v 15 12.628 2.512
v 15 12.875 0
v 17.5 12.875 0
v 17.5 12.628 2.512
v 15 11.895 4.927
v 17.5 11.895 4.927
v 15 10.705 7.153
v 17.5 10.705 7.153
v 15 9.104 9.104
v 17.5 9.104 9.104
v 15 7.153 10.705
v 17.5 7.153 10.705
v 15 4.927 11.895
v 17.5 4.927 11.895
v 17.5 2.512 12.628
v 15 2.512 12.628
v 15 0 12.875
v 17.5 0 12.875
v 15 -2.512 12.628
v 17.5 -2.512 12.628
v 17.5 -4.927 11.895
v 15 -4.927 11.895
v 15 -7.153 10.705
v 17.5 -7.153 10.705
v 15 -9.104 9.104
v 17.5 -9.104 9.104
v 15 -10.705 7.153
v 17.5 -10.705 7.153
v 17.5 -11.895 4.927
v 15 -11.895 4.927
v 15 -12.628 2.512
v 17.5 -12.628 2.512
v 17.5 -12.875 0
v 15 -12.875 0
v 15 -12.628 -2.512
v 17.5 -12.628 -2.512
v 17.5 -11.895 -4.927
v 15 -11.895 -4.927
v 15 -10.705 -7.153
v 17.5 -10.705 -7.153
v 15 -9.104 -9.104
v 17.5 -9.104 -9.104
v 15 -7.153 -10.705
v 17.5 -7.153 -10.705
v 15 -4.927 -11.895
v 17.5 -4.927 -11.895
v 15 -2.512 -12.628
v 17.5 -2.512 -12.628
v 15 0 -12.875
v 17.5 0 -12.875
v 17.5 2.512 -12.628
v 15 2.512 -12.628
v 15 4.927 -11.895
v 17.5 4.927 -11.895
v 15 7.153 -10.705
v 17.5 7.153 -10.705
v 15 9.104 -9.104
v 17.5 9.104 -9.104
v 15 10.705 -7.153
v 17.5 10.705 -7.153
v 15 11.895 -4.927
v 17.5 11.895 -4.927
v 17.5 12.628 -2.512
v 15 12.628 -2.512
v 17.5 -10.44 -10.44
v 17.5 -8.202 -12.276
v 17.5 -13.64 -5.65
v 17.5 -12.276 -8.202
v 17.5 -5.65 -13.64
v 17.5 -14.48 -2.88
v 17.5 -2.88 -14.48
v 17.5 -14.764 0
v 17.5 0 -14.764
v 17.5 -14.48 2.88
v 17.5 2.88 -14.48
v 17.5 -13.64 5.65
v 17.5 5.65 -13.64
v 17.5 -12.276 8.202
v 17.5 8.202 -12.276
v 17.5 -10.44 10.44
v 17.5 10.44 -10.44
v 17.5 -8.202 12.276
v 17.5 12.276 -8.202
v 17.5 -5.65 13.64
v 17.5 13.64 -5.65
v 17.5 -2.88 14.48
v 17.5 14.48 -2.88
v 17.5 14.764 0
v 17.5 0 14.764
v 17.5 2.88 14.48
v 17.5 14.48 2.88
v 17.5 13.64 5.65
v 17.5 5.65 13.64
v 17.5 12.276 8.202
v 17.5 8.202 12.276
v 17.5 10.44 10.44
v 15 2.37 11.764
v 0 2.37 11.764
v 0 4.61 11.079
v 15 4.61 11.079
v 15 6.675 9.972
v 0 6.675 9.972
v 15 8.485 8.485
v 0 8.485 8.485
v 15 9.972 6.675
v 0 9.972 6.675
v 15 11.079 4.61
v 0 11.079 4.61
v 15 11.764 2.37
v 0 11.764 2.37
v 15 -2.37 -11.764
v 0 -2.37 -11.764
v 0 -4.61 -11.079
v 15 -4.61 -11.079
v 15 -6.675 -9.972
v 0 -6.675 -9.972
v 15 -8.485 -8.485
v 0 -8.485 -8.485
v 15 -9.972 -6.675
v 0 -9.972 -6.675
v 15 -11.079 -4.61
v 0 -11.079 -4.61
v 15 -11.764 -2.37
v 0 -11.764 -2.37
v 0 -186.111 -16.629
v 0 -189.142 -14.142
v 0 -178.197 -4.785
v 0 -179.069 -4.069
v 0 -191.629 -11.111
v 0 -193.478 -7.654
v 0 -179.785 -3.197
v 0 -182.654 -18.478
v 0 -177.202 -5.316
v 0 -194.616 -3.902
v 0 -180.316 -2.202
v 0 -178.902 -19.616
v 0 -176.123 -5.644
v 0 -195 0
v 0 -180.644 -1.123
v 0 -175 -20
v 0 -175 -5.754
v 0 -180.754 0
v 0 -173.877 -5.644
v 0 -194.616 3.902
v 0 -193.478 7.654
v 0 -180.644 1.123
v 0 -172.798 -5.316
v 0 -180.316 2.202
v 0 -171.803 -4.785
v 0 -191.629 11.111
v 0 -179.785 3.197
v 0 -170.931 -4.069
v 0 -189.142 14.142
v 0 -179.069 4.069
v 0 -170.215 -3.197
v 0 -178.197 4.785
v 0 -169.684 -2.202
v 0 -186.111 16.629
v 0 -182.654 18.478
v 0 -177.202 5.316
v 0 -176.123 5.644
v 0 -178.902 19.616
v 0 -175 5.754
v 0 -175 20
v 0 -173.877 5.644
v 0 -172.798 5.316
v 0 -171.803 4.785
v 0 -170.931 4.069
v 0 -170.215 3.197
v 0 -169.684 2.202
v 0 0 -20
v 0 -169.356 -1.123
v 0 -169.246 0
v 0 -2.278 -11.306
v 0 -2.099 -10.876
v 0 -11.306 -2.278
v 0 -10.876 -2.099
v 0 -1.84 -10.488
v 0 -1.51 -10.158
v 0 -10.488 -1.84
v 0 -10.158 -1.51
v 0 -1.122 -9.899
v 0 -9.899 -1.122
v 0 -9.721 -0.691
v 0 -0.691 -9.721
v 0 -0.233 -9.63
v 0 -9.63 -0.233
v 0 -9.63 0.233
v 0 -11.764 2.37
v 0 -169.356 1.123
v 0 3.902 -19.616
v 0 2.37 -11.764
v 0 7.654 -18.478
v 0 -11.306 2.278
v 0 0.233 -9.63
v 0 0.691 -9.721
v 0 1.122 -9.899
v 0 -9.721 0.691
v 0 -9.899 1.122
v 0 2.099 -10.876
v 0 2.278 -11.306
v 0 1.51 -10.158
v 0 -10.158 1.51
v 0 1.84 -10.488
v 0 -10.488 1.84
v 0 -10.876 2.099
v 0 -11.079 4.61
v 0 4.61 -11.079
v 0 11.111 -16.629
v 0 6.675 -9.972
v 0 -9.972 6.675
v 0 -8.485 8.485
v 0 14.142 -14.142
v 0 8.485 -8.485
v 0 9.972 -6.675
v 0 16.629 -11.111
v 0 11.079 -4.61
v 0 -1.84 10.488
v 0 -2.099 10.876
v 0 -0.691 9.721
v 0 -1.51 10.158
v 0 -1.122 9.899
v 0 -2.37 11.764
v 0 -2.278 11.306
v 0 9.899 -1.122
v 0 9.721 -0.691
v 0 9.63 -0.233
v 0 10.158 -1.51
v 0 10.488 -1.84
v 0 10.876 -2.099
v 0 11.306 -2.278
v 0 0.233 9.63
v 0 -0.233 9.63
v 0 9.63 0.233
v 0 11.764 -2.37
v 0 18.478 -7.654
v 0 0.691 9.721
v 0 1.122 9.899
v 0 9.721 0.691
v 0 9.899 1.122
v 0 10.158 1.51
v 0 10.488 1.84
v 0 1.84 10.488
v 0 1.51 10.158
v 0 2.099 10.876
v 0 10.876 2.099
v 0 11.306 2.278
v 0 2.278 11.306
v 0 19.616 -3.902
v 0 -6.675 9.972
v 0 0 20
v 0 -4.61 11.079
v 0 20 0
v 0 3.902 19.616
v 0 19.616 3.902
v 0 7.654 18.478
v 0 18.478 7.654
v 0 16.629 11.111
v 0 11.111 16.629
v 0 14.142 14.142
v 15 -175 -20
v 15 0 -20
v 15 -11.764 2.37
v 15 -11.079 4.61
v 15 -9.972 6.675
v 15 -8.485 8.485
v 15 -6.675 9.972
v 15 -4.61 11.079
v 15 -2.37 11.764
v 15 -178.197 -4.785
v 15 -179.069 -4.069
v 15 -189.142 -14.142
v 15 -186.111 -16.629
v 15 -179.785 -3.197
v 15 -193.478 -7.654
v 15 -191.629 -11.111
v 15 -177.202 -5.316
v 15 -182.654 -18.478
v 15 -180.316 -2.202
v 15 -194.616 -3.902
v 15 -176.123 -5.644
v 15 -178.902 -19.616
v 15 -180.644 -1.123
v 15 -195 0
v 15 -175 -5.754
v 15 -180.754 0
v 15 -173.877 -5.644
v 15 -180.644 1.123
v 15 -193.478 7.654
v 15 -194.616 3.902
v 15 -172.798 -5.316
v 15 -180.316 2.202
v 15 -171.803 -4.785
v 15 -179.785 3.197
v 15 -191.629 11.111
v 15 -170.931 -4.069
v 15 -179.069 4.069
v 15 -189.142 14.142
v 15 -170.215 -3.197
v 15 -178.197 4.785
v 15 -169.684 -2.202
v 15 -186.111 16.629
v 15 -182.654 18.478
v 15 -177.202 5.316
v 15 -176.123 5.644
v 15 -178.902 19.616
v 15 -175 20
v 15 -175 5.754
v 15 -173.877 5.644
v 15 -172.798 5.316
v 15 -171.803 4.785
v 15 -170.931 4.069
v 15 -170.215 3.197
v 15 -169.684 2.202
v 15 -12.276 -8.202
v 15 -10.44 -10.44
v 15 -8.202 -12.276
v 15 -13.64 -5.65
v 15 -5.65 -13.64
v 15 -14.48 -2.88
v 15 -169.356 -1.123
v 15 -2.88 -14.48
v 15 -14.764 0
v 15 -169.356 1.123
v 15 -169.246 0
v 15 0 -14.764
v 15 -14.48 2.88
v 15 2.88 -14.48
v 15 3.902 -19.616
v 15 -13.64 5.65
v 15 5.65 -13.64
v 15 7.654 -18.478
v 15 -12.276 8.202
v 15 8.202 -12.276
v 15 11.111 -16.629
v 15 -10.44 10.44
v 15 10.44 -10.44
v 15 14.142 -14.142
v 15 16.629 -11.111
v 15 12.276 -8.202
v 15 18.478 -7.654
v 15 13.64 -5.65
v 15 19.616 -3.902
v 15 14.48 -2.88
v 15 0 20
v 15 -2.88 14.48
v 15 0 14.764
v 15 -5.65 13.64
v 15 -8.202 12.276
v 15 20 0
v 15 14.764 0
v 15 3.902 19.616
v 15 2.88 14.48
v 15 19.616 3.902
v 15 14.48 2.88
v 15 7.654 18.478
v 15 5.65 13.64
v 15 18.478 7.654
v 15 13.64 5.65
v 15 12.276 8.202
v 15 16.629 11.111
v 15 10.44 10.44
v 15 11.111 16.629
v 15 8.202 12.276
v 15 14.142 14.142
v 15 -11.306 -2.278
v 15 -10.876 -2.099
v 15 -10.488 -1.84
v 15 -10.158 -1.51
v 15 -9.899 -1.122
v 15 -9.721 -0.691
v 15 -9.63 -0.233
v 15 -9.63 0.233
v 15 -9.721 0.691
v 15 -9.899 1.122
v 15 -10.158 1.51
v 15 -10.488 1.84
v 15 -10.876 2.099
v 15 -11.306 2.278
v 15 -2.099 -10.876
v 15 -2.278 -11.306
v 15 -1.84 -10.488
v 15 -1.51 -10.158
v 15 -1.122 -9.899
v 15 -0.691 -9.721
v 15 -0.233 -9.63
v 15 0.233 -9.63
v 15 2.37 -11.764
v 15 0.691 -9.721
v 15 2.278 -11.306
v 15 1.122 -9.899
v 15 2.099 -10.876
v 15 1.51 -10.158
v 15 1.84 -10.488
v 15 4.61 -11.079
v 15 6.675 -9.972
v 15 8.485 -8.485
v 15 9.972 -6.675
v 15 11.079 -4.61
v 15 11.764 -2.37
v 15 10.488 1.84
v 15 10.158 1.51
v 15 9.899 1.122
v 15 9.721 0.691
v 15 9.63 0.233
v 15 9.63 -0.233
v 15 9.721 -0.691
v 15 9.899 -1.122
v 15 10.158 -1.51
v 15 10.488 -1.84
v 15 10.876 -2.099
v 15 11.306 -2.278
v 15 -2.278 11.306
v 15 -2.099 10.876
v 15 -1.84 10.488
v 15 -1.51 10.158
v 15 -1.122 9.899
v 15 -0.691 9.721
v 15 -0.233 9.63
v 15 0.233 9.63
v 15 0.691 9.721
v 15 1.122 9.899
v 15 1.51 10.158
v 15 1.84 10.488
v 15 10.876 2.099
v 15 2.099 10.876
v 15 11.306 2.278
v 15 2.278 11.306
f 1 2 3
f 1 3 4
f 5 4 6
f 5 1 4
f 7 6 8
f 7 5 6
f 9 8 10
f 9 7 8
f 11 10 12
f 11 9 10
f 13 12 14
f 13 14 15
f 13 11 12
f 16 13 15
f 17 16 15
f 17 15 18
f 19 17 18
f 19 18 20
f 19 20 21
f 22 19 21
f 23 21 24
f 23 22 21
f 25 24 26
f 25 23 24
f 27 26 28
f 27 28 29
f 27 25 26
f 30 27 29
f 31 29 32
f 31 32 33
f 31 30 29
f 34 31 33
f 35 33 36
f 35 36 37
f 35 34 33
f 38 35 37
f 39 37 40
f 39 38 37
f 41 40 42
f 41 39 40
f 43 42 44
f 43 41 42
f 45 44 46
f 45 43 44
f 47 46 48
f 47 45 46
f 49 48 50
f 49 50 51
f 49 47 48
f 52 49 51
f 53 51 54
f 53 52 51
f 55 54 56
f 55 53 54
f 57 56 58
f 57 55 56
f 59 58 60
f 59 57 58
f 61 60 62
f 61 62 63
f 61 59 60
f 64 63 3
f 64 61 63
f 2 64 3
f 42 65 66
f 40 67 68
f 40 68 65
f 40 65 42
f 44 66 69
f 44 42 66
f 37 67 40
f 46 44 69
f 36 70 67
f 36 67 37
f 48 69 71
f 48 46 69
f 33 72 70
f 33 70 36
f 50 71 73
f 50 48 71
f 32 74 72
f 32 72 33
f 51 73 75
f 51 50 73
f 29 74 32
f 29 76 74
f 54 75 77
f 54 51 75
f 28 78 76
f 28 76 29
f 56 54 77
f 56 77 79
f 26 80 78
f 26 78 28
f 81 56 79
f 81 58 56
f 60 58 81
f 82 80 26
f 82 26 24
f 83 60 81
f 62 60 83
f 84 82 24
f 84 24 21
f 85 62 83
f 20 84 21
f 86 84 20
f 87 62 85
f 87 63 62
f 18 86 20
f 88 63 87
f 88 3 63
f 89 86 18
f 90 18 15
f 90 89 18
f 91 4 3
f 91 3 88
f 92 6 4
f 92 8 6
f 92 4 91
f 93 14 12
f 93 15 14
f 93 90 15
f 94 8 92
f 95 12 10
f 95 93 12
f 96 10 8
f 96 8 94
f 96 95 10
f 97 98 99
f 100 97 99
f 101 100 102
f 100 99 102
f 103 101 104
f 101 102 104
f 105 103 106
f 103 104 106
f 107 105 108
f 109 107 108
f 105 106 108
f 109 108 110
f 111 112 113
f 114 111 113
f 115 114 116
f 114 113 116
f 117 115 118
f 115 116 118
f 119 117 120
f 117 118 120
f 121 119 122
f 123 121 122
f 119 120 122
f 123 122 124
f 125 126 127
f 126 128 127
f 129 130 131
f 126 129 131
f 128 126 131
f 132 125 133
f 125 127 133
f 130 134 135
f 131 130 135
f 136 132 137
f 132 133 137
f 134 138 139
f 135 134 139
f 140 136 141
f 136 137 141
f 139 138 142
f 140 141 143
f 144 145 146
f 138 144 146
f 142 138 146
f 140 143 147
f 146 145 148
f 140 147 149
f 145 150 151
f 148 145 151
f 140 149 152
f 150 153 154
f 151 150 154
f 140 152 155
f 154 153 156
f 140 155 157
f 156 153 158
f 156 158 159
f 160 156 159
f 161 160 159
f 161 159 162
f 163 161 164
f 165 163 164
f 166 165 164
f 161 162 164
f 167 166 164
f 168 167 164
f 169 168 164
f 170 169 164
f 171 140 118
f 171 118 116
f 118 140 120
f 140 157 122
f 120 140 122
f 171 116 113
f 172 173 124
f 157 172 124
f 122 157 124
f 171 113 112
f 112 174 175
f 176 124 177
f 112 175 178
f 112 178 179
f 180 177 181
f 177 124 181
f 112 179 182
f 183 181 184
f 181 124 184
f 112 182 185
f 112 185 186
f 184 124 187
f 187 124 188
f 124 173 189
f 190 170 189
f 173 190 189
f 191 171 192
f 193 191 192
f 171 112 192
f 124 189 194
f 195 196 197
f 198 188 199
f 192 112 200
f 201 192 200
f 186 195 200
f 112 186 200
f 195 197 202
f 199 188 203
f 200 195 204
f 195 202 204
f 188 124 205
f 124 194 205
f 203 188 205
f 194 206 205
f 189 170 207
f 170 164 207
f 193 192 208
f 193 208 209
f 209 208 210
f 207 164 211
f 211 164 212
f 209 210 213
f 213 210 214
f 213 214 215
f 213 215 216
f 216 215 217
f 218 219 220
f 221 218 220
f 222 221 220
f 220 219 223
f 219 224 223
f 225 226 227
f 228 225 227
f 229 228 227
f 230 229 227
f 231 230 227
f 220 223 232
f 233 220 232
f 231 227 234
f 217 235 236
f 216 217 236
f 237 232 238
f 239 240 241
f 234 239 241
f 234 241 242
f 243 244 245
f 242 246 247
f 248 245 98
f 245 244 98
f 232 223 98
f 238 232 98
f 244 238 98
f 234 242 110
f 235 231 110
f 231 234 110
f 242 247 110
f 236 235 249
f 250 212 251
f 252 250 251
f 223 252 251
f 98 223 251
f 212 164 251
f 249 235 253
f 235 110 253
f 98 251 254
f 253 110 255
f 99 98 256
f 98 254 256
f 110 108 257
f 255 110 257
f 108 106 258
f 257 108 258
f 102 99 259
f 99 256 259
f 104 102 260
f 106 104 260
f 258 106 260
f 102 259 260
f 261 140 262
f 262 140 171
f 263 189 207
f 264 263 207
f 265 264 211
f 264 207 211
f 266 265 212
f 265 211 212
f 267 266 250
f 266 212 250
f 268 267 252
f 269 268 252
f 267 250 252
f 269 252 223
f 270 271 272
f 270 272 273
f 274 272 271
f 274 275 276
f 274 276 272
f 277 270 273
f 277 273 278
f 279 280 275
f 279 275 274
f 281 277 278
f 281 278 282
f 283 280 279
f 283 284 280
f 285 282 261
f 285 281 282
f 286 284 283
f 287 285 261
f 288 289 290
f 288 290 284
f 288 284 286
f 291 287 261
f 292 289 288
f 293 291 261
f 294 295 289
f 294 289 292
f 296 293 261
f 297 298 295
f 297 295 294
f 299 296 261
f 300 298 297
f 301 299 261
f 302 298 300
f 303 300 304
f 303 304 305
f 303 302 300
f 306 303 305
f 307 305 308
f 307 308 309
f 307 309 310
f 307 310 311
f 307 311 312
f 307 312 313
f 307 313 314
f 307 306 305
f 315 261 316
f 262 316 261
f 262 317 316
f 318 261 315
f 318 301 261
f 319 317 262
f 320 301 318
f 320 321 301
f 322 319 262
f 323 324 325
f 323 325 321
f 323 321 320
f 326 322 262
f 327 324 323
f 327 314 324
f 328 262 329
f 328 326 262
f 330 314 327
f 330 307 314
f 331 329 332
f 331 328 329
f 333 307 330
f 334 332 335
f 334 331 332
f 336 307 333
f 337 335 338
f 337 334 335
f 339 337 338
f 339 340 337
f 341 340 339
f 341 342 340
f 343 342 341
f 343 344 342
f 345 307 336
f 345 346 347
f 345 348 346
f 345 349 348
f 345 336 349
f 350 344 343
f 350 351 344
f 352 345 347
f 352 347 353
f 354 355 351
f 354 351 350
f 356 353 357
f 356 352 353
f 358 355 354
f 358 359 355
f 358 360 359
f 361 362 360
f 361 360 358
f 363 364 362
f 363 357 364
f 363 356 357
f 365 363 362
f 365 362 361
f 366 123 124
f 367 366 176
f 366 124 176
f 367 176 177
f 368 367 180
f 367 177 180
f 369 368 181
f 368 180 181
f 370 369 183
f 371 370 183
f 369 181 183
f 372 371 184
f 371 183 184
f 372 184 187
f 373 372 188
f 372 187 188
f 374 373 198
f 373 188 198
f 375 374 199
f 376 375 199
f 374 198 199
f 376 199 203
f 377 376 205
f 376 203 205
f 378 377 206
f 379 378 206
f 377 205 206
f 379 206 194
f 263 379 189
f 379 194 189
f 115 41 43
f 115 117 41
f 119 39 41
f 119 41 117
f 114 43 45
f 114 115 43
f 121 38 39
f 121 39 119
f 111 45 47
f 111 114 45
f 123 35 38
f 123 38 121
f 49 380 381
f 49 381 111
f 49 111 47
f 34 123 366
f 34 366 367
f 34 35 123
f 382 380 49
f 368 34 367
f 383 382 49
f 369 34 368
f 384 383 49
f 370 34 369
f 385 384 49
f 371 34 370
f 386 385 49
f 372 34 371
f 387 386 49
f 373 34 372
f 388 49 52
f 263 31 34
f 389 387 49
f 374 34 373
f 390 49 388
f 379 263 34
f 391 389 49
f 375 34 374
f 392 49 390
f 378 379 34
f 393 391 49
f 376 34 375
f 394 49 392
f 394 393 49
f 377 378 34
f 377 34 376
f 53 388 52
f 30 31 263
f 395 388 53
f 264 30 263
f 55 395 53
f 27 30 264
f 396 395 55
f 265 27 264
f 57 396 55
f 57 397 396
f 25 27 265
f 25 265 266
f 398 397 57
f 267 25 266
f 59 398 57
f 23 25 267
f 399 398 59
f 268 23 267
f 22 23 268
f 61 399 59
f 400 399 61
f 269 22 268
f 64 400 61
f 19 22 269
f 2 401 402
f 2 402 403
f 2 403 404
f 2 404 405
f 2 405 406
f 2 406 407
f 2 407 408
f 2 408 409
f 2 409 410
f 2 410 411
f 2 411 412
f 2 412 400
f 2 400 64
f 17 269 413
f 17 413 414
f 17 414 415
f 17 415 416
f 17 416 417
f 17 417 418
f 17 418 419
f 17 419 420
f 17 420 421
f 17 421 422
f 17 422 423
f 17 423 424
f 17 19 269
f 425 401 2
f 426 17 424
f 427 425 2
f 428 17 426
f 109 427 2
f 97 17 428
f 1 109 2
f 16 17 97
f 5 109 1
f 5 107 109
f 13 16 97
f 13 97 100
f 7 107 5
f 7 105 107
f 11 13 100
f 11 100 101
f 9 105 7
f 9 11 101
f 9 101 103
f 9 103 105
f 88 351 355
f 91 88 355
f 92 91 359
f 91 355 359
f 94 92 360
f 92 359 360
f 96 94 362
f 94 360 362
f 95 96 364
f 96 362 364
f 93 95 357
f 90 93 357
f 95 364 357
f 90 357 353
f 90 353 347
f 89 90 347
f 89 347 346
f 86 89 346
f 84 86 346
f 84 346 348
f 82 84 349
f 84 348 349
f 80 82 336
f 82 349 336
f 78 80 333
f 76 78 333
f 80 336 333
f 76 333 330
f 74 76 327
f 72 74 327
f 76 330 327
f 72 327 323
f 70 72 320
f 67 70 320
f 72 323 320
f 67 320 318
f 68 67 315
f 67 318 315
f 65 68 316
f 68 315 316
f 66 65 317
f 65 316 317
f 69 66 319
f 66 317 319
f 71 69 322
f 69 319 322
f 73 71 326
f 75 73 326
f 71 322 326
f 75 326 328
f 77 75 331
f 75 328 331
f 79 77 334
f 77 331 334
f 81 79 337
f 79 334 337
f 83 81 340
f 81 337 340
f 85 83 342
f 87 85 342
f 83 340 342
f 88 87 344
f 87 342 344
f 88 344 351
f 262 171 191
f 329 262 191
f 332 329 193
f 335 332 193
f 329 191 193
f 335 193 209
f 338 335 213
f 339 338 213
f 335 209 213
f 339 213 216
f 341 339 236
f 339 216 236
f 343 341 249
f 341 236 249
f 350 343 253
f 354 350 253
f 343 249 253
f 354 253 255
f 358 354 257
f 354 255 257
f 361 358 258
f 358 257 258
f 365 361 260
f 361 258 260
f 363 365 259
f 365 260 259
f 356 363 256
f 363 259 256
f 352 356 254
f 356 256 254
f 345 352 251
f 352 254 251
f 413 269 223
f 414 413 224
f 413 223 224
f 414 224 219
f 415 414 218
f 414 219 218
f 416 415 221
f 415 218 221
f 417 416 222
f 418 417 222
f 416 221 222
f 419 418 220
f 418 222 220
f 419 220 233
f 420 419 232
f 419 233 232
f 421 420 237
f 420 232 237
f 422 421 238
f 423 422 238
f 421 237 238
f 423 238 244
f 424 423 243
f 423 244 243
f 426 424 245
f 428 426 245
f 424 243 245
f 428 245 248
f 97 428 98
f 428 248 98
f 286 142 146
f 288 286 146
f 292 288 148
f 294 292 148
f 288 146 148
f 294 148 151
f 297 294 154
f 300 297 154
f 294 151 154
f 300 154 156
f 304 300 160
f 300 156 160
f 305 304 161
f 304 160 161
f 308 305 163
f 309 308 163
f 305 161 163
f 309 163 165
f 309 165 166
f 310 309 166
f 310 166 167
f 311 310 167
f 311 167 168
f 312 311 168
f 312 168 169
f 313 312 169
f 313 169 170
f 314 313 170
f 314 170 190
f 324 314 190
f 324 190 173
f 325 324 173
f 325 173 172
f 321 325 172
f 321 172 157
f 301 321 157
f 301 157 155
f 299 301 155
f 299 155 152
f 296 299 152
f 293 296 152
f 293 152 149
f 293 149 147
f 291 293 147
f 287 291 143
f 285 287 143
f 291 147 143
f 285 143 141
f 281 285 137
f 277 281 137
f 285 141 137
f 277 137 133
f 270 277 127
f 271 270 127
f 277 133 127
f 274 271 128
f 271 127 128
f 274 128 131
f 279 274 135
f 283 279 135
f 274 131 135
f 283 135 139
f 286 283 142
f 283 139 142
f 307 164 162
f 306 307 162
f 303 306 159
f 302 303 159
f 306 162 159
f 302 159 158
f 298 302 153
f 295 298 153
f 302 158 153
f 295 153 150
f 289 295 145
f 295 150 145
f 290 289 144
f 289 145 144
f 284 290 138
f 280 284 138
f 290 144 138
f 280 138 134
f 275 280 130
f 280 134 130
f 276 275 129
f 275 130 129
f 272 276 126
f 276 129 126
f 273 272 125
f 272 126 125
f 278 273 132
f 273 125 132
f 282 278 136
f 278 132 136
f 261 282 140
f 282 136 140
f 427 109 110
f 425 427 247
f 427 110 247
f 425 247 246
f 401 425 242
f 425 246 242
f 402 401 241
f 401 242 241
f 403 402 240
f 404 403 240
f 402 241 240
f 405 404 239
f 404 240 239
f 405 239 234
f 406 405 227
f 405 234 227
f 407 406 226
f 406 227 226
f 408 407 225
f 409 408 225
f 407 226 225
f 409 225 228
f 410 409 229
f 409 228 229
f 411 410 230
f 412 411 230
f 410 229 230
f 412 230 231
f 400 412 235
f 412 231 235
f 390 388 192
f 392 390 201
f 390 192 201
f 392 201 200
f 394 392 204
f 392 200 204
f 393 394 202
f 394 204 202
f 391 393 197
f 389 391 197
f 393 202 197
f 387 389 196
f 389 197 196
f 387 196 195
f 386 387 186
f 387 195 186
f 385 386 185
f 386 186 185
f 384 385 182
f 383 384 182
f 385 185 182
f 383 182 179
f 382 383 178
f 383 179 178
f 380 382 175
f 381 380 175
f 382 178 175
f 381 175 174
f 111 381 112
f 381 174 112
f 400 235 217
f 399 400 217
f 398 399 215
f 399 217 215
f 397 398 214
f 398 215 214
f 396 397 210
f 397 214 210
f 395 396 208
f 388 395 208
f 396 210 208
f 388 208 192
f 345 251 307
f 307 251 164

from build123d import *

# Parameters (mm, degrees)
F1_DEPTH = 15
F2_R     = 14.76375
F2_R_2   = 12.875
F3_DEPTH = 2.5
F5_D     = 11.50874


with BuildPart() as f1:
    # F0 (on Right) → F1 (new body)
    with BuildSketch(Plane.YZ):
        with BuildLine():
            Line((-175, -20), (0, -20))
            ThreePointArc((0, -20), (20, 0), (0, 20))
            Line((0, 20), (-175, 20))
            ThreePointArc((-175, 20), (-195, 0), (-175, -20))
        make_face()
        with BuildLine():
            ThreePointArc((-11.7637353516, 2.3695000693), (-8.4852813742, 8.4852813742), (-2.3695000693, 11.7637353516))
            ThreePointArc((-2.3695000693, 11.7637353516), (0, 9.61875), (2.3695000693, 11.7637353516))
            ThreePointArc((2.3695000693, 11.7637353516), (8.4852813742, 8.4852813742), (11.7637353516, 2.3695000693))
            ThreePointArc((11.7637353516, 2.3695000693), (9.61875, 0), (11.7637353516, -2.3695000693))
            ThreePointArc((11.7637353516, -2.3695000693), (8.4852813742, -8.4852813742), (2.3695000693, -11.7637353516))
            ThreePointArc((2.3695000693, -11.7637353516), (0, -9.61875), (-2.3695000693, -11.7637353516))
            ThreePointArc((-2.3695000693, -11.7637353516), (-8.4852813742, -8.4852813742), (-11.7637353516, -2.3695000693))
            ThreePointArc((-11.7637353516, -2.3695000693), (-9.61875, 0), (-11.7637353516, 2.3695000693))
        make_face(mode=Mode.SUBTRACT)
    extrude(amount=F1_DEPTH)

    # F2 (on face) → F3 (join)
    with BuildSketch(Plane.YZ.offset(15)):
        Circle(F2_R)
        Circle(F2_R_2, mode=Mode.SUBTRACT)
    extrude(amount=F3_DEPTH)

    # F5 (through all)
    with Locations(Plane.YZ.offset(15)):
        with Locations((-175, 0)):
            Hole(F5_D / 2)


solid = f1.part
